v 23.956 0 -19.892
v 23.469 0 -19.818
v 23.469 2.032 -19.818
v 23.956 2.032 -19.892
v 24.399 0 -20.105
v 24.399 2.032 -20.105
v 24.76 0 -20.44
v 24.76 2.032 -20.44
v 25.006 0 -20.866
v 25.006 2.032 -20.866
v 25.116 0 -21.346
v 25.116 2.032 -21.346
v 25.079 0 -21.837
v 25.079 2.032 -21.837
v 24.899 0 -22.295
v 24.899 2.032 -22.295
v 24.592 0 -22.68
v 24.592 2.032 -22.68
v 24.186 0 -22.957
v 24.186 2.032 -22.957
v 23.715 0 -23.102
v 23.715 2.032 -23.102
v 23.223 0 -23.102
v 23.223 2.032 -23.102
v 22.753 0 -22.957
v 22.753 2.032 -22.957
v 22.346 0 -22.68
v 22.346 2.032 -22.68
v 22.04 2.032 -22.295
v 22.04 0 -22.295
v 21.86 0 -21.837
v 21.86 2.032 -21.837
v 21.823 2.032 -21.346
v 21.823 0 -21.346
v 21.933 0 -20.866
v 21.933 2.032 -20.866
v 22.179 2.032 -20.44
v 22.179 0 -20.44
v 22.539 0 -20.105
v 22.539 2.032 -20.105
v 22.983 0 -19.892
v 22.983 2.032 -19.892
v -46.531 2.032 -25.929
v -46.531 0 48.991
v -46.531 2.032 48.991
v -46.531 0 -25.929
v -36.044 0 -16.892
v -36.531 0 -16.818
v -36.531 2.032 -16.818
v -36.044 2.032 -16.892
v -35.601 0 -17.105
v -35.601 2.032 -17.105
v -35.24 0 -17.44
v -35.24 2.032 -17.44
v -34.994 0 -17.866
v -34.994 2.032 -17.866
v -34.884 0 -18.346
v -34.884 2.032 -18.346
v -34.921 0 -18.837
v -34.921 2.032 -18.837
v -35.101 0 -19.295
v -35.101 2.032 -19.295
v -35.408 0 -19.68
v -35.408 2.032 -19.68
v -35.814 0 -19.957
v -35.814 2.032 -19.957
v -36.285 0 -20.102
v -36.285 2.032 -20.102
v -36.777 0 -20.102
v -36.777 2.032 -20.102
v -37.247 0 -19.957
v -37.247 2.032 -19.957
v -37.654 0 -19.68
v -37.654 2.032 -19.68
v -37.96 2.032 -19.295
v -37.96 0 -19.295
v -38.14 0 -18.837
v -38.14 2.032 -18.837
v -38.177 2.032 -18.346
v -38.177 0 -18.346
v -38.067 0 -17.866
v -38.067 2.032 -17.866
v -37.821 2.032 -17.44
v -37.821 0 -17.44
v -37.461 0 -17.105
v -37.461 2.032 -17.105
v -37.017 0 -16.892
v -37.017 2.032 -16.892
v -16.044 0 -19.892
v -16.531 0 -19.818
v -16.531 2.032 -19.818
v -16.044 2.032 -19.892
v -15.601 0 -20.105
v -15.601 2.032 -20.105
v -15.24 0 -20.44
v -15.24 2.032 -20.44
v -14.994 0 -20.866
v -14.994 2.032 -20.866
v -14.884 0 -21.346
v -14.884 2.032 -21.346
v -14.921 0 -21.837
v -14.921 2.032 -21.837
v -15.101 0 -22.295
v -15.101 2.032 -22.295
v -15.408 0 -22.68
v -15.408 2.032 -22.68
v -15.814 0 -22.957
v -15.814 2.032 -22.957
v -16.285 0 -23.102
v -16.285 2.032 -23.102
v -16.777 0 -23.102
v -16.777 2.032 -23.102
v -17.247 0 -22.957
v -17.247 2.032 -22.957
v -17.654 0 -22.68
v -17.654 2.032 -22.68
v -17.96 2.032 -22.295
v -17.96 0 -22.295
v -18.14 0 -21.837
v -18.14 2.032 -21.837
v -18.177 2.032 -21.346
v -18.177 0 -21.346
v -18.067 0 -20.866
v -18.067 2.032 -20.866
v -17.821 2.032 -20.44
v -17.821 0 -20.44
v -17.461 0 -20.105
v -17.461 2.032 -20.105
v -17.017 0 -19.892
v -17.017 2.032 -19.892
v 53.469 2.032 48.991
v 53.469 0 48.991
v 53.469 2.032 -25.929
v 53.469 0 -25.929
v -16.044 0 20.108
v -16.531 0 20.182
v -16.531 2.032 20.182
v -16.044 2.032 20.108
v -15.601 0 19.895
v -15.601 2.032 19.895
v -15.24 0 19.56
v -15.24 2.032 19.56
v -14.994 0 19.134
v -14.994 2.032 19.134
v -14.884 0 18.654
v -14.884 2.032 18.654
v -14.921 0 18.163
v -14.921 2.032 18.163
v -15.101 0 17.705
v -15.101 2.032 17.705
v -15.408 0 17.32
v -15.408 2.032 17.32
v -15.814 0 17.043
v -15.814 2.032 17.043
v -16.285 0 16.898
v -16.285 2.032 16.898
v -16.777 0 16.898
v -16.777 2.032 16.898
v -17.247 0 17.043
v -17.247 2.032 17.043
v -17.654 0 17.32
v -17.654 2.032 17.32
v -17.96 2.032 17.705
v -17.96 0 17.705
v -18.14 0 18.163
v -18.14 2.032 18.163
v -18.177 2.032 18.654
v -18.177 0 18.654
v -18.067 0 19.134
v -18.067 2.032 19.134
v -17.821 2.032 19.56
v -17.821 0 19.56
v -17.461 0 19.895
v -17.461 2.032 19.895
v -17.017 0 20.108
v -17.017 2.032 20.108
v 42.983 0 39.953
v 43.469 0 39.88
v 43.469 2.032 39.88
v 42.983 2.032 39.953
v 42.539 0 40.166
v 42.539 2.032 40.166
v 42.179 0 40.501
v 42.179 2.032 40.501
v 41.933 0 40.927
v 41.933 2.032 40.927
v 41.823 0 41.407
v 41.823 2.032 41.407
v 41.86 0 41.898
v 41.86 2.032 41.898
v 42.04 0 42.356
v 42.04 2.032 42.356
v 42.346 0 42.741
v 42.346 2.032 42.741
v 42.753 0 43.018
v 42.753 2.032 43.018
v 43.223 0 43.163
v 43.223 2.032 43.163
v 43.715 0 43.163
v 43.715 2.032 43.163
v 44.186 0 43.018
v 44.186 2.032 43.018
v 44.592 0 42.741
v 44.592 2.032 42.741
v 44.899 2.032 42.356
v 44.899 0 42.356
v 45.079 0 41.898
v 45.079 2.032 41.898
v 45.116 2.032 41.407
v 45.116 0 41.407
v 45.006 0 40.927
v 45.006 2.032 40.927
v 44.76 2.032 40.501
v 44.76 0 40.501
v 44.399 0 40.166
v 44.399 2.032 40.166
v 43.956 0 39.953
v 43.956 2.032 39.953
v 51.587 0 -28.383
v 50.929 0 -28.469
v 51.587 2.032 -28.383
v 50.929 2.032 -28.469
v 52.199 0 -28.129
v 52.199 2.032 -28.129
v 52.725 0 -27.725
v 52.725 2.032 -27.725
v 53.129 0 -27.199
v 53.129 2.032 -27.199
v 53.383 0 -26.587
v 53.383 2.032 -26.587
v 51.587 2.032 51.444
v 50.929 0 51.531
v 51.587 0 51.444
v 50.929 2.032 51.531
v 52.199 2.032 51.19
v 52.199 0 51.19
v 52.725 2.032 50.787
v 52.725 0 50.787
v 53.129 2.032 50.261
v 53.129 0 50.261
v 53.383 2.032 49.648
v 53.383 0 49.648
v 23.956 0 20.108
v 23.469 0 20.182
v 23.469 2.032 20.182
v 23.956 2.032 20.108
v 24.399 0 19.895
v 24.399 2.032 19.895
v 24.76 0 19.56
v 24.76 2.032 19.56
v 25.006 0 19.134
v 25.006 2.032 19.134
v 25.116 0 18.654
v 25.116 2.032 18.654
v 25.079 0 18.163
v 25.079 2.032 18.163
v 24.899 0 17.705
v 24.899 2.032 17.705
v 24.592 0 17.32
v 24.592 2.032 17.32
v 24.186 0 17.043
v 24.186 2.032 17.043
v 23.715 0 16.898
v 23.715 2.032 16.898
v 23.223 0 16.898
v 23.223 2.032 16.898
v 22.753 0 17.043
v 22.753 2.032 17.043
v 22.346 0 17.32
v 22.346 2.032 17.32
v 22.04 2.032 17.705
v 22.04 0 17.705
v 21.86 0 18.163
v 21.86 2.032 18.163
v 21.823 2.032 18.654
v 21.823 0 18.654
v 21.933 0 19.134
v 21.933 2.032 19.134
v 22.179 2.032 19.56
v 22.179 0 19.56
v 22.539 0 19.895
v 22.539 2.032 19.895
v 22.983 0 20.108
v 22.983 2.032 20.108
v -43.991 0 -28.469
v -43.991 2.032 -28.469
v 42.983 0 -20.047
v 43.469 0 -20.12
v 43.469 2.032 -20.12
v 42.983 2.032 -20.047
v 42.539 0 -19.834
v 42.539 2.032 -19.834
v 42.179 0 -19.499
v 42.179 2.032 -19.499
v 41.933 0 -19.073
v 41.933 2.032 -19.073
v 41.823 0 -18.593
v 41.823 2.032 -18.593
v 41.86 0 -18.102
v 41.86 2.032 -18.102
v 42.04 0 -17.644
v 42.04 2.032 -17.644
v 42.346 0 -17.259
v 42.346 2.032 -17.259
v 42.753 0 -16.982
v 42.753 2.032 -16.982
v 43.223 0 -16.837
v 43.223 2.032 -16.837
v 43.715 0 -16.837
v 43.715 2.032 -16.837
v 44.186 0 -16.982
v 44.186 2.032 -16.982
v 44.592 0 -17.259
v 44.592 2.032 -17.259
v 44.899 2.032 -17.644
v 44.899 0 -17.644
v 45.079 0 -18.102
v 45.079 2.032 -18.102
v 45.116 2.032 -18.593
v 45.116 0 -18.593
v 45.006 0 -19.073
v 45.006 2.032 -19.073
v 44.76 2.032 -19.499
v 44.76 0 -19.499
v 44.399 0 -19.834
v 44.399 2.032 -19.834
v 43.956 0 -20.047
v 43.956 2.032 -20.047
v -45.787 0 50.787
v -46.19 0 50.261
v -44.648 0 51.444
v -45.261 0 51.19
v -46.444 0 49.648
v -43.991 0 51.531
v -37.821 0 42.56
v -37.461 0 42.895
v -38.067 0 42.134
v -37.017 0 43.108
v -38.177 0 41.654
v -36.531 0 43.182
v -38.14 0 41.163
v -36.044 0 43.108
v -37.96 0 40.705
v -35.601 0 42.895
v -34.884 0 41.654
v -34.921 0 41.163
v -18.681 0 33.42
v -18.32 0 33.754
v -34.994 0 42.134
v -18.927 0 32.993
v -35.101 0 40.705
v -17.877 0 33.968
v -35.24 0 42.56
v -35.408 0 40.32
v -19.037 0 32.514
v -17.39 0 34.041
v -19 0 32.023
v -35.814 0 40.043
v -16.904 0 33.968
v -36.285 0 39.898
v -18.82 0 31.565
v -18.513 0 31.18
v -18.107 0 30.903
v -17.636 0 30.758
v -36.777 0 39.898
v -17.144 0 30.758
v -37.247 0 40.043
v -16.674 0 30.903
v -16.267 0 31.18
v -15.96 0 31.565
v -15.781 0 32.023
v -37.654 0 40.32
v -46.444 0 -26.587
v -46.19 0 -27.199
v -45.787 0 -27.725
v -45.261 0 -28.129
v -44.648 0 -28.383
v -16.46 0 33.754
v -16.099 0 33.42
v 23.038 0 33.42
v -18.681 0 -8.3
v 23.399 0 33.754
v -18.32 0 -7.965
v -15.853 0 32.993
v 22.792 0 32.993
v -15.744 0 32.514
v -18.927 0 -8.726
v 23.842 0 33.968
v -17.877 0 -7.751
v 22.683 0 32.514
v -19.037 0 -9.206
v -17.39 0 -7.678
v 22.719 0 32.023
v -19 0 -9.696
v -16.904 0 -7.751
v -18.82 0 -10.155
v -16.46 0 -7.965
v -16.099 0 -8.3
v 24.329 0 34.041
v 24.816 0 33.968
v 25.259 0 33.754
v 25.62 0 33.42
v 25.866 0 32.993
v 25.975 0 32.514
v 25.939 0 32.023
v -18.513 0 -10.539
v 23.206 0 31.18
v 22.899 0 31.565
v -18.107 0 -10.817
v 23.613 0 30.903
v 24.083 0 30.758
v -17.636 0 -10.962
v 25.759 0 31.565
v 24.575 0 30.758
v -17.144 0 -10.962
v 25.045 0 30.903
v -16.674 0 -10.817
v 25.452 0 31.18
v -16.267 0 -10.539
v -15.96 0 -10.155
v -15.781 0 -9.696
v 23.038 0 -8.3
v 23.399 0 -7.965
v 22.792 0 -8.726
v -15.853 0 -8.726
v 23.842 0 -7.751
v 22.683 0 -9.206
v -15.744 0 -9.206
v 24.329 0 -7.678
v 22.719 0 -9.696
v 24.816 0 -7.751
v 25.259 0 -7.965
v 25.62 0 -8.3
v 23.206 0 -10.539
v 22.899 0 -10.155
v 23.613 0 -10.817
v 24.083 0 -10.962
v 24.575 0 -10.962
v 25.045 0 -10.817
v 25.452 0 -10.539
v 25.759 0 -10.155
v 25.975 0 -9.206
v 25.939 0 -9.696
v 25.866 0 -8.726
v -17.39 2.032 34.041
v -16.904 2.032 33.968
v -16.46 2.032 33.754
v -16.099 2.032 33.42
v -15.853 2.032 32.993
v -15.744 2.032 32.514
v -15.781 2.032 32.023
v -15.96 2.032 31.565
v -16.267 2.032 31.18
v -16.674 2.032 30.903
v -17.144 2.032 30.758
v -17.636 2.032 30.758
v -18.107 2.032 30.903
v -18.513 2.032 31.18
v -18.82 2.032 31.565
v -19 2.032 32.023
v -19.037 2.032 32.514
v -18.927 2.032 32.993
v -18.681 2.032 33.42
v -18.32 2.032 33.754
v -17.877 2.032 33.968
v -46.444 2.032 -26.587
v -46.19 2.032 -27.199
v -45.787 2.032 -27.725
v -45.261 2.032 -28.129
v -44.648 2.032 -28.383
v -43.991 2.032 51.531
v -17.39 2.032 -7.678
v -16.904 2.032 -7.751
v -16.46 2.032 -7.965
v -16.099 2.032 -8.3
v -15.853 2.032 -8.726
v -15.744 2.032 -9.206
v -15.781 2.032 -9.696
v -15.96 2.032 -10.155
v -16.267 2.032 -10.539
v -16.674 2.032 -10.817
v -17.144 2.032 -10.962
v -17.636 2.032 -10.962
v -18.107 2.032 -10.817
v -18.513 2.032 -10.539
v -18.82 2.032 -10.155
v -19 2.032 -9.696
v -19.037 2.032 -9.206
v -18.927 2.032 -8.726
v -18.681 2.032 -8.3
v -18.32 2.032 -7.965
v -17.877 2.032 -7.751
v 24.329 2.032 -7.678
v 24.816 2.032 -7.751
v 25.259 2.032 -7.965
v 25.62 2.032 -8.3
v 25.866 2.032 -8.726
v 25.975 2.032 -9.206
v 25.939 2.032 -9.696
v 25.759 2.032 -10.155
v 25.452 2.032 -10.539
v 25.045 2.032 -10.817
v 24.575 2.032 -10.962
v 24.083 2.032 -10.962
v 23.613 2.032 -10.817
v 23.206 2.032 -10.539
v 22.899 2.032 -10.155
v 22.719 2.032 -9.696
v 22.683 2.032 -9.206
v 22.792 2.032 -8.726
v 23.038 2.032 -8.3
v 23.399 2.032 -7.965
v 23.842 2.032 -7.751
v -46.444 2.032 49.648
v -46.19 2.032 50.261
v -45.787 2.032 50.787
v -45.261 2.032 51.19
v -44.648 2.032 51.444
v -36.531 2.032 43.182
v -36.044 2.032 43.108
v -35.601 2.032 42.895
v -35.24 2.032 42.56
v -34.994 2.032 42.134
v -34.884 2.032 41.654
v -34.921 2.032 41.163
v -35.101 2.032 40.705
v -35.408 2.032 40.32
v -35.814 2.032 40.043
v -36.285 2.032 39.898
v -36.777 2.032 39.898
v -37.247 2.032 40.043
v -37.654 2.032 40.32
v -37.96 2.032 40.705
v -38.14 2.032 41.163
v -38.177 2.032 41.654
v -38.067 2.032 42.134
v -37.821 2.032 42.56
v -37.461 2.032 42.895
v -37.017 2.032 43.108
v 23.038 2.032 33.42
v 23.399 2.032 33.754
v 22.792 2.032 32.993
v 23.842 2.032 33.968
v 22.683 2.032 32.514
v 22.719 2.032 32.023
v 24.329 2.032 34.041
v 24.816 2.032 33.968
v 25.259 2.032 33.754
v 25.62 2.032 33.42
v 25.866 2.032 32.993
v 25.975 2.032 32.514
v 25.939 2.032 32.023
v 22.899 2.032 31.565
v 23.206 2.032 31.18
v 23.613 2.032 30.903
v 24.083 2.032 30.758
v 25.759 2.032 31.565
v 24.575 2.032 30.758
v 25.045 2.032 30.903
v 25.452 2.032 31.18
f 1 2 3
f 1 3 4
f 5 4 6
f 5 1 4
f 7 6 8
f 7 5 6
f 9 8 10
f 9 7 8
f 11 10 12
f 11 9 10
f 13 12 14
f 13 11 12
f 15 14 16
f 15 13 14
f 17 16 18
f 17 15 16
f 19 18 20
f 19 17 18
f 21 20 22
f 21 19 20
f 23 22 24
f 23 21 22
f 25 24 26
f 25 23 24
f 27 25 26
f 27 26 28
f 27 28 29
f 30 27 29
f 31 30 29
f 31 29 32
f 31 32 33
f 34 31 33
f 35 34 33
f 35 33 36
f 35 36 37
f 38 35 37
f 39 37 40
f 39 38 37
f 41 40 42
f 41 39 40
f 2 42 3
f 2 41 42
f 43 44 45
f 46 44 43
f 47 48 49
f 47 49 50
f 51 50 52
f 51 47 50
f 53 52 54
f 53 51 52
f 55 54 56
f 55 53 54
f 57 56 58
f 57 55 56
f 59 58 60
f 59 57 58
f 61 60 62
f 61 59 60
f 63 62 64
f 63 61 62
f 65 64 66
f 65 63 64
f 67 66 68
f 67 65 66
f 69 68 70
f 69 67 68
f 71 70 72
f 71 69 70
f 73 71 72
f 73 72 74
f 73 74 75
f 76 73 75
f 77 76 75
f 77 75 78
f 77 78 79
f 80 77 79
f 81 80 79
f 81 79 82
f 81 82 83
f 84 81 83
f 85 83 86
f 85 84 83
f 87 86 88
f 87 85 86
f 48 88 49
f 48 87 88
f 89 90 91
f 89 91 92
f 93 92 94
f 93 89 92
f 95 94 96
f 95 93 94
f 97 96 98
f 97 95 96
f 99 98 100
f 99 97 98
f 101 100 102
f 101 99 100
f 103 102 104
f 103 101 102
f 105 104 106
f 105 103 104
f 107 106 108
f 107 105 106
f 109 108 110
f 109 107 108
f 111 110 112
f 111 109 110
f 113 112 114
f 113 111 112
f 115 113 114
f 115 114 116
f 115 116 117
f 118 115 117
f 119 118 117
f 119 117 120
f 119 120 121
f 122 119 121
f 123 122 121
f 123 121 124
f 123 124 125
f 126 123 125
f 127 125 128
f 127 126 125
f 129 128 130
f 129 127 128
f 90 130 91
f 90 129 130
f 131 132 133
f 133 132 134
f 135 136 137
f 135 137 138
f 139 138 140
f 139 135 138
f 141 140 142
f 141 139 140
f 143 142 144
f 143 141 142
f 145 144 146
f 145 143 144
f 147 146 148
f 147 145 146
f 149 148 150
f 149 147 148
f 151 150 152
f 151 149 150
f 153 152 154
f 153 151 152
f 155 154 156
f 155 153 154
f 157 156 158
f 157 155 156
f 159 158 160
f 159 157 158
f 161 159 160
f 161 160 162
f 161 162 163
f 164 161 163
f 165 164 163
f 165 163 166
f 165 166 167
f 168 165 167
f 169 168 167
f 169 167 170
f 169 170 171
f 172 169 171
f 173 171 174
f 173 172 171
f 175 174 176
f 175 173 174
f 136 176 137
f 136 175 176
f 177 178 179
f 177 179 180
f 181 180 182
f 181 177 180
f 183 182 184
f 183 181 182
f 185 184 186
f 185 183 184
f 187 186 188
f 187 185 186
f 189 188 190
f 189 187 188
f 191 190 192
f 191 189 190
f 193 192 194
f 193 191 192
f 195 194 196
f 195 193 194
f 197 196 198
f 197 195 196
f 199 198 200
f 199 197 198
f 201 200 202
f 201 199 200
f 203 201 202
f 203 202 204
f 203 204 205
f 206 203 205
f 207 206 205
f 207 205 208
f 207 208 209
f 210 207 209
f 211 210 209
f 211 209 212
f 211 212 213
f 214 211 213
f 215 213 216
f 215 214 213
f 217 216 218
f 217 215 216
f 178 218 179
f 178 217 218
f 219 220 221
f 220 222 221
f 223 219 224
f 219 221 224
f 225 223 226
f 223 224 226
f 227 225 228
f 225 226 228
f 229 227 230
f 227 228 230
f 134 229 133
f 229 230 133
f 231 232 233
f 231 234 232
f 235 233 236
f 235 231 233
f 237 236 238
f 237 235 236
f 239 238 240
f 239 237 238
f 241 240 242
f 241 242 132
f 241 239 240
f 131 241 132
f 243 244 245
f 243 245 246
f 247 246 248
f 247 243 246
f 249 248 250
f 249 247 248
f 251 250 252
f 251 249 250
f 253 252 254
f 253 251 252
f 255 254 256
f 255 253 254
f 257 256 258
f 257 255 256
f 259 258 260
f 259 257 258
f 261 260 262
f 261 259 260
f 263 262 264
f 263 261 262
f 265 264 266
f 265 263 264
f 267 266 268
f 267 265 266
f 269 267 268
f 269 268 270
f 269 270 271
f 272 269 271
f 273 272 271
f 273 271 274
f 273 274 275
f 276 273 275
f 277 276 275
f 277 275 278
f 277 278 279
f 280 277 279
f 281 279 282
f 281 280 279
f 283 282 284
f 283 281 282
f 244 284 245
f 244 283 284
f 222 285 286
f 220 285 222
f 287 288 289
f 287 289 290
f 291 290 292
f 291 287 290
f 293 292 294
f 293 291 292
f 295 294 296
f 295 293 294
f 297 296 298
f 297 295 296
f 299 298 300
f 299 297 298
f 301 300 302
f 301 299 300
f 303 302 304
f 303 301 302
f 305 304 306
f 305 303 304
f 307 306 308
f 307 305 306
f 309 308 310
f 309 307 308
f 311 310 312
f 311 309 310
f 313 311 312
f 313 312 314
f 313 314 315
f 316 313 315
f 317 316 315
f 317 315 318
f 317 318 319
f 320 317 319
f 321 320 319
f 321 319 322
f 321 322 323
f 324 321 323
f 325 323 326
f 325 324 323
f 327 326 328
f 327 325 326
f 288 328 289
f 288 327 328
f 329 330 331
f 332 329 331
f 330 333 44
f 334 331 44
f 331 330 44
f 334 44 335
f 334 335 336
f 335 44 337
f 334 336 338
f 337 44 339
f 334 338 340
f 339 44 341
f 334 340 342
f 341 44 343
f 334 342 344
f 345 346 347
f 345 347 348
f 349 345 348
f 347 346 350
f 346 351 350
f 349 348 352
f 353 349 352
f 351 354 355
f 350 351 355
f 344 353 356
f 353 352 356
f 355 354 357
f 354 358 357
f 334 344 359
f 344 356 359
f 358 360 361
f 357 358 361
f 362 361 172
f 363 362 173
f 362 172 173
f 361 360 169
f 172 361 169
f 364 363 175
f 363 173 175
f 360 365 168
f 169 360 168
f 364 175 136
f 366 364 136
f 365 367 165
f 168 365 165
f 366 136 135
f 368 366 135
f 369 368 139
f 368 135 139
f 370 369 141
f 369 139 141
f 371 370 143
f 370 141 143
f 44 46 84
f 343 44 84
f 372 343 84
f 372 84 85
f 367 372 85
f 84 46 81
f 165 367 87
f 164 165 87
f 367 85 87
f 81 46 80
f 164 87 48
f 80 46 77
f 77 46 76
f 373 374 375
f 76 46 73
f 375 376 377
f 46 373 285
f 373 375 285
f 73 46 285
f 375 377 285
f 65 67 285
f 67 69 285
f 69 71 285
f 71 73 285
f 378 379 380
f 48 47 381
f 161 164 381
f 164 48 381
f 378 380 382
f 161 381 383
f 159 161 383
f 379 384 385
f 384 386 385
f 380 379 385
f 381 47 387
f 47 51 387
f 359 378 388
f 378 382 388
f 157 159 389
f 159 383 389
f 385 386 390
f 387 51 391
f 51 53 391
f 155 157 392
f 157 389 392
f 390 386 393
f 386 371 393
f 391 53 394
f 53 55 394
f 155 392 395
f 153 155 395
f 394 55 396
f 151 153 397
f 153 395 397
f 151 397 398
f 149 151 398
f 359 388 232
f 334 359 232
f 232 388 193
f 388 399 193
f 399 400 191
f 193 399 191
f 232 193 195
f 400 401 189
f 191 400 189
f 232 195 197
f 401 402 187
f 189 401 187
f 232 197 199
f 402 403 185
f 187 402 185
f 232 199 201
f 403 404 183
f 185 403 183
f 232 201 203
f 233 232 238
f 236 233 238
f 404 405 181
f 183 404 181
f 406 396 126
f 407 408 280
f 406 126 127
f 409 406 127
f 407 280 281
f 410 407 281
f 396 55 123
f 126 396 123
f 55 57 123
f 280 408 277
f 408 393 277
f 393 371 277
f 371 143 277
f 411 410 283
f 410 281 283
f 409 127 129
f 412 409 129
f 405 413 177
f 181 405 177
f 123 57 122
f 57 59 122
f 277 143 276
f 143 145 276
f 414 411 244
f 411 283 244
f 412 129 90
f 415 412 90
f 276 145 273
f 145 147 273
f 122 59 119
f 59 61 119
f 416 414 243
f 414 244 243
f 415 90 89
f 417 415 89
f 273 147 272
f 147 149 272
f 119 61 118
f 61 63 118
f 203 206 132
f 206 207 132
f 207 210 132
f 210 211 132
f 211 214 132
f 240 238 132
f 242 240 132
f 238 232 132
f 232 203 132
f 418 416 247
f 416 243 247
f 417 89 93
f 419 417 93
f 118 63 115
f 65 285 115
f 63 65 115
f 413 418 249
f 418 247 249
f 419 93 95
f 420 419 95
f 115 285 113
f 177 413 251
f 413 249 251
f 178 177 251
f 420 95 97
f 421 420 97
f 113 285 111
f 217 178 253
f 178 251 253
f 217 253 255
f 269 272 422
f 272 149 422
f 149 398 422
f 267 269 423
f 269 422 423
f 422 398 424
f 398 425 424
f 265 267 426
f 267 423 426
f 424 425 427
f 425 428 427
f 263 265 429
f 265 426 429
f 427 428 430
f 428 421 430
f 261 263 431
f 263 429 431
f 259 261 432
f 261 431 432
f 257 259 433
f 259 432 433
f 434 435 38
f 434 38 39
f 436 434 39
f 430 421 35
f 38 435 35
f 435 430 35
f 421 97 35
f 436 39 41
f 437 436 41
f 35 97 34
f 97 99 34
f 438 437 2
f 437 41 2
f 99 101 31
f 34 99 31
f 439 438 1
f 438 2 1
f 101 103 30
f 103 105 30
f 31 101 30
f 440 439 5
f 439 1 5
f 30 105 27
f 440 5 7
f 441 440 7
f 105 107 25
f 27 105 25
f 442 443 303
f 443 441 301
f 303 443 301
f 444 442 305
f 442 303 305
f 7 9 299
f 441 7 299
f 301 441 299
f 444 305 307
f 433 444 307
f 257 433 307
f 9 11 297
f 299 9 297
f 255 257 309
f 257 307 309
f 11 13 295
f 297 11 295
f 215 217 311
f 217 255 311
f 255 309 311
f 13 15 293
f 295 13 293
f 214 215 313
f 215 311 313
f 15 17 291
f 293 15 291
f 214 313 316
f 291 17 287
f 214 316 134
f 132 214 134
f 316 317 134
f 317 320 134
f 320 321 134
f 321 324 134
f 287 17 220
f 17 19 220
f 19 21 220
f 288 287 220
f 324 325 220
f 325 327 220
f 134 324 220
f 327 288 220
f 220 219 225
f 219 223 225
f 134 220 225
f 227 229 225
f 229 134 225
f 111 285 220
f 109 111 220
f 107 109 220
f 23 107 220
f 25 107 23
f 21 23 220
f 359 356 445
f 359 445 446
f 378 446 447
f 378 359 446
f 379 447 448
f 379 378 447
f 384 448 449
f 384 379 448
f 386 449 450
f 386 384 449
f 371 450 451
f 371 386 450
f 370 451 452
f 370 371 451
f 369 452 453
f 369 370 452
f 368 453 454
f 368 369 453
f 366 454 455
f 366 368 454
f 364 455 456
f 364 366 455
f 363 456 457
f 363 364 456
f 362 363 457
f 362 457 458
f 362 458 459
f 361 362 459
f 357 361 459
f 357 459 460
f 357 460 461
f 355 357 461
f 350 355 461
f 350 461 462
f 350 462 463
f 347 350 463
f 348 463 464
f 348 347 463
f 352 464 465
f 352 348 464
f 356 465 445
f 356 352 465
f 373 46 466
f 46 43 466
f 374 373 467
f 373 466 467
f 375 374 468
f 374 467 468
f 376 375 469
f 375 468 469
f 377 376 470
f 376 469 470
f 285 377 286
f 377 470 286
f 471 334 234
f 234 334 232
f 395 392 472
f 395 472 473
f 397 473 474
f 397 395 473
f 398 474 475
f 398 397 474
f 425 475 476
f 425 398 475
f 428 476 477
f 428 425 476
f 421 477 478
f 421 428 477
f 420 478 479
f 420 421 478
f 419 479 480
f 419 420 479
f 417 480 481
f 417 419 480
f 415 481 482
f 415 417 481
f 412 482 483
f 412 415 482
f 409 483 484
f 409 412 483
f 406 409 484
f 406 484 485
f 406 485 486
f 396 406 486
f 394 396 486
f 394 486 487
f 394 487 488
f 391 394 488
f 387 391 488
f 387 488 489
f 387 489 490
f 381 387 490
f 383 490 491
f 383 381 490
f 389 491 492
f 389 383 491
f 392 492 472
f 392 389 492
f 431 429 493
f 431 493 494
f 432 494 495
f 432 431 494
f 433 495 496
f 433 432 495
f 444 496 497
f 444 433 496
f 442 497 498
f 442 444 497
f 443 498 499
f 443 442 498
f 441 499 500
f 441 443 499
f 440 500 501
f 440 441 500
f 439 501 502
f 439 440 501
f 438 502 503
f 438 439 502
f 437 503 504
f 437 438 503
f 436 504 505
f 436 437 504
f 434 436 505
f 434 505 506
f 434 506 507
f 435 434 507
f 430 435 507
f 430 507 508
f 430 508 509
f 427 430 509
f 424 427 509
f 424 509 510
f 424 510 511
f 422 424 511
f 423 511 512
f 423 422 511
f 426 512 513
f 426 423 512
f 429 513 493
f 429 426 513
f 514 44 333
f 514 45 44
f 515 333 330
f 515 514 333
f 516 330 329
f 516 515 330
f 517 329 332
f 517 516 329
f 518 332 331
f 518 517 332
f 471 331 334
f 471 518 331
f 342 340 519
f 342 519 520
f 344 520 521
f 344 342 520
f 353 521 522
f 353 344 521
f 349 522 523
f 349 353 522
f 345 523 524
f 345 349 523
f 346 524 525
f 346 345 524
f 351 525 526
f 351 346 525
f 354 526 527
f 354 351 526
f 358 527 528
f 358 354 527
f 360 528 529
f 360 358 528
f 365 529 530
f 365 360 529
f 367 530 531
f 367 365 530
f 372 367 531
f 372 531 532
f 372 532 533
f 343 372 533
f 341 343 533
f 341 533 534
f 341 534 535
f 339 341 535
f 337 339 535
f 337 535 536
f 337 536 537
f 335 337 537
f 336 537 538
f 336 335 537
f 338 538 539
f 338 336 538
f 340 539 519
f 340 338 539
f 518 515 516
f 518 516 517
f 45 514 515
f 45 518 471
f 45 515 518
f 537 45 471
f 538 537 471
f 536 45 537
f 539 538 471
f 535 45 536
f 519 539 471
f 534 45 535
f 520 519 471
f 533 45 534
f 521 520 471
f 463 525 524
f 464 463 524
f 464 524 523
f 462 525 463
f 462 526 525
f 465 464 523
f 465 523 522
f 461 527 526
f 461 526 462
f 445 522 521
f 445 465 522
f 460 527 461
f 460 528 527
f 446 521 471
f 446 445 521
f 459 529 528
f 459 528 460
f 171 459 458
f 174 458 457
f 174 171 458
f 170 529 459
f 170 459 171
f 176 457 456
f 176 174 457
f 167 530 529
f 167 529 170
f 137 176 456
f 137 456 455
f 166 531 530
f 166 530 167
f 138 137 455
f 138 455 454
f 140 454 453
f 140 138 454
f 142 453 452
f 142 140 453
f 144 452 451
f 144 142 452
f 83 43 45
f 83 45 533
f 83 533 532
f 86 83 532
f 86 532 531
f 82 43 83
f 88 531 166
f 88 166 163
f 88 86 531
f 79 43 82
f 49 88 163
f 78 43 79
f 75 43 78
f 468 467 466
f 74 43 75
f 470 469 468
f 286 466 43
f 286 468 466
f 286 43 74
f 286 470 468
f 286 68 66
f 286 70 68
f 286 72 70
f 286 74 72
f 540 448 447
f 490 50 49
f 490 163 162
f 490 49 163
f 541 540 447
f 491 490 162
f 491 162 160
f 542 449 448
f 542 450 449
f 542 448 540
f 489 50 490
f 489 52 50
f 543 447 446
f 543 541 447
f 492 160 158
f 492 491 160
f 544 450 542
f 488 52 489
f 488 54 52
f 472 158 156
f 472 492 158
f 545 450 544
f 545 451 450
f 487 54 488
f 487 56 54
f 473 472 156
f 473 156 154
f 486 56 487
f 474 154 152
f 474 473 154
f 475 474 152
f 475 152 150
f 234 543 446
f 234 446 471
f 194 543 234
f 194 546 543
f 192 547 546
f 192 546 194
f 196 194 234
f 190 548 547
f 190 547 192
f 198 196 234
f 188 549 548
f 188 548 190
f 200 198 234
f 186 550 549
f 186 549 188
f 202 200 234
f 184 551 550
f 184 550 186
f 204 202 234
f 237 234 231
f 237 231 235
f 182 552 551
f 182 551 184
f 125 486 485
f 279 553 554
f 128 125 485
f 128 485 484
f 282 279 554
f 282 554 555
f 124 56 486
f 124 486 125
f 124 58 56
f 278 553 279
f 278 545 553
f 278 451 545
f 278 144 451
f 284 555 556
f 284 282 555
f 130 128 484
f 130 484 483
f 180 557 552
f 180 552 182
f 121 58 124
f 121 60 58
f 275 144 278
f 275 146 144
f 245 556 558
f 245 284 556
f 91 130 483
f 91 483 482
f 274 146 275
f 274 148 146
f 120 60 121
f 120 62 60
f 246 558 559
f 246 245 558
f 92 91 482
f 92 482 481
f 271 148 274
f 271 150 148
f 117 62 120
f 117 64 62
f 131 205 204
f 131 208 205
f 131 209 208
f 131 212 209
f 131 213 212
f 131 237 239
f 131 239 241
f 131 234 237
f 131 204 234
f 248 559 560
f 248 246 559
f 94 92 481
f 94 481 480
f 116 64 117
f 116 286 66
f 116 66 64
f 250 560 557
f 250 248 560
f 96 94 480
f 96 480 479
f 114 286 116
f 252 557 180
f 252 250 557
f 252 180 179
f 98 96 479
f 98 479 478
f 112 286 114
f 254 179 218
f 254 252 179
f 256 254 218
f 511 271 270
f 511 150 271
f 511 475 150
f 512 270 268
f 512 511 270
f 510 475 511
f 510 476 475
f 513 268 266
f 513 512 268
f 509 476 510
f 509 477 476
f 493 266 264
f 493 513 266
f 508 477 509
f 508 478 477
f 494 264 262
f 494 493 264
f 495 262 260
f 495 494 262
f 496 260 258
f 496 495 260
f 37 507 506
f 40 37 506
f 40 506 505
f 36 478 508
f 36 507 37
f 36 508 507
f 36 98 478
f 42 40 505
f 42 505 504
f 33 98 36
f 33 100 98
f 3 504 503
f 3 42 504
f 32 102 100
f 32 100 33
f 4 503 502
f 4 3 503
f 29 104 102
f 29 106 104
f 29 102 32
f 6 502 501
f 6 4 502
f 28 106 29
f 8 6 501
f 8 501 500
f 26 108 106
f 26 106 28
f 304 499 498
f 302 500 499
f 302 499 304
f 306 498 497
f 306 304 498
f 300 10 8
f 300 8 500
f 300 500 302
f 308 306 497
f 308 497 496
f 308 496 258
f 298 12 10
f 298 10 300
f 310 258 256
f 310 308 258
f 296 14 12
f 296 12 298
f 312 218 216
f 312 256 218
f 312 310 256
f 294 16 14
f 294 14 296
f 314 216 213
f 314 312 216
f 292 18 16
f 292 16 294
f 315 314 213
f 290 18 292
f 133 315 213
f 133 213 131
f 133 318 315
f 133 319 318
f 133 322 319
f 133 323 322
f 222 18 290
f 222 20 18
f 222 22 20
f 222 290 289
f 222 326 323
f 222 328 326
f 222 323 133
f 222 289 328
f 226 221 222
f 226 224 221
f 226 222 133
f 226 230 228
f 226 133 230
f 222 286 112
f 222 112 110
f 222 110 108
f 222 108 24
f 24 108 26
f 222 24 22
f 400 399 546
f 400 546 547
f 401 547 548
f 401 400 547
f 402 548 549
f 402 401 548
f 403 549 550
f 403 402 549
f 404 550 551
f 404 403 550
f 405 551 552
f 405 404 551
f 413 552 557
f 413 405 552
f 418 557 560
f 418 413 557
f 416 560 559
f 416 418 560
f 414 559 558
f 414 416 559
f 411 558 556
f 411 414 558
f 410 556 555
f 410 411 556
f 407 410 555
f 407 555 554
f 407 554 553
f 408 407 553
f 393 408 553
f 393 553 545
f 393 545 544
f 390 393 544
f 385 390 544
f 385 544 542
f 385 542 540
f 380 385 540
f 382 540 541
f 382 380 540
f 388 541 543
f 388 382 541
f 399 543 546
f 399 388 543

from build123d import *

# Parameters (mm, degrees)
SKETCH1_W           = 100
SKETCH1_H           = 80
SKETCH1_R           = 1.651
BOSS_EXTRUDE1_DEPTH = 2.032
FILLET1_R           = 2.54
FILLET2_R           = 2.54


with BuildPart() as part:
    # Sketch1 → Boss-Extrude1 (new body)
    with BuildSketch(Plane(origin=(0, 0, 0), x_dir=(1, 0, 0), z_dir=(0, 1, 0))):
        with Locations((3.469387755, -11.530612245)):
            Rectangle(SKETCH1_W, SKETCH1_H)
        with Locations(Location((-36.530612245, 18.469387755, 0), (0, 0, 270))):
            Circle(SKETCH1_R, mode=Mode.SUBTRACT)
        with Locations(Location((-36.530612245, -41.530612245, 0), (0, 0, 270))):
            Circle(SKETCH1_R, mode=Mode.SUBTRACT)
        with Locations(Location((-16.530612245, 21.469387755, 0), (0, 0, 270))):
            Circle(SKETCH1_R, mode=Mode.SUBTRACT)
        with Locations(Location((23.469387755, 21.469387755, 0), (0, 0, 270))):
            Circle(SKETCH1_R, mode=Mode.SUBTRACT)
        with Locations(Location((-16.530612245, -18.530612245, 0), (0, 0, 270))):
            Circle(SKETCH1_R, mode=Mode.SUBTRACT)
        with Locations(Location((23.469387755, -18.530612245, 0), (0, 0, 270))):
            Circle(SKETCH1_R, mode=Mode.SUBTRACT)
        with Locations(Location((-17.39026229, 9.3290378, 0), (0, 0, 270))):
            Circle(SKETCH1_R, mode=Mode.SUBTRACT)
        with Locations(Location((24.3290378, 9.3290378, 0), (0, 0, 270))):
            Circle(SKETCH1_R, mode=Mode.SUBTRACT)
        with Locations(Location((43.469387755, -41.530612245, 0), (0, 0, 90))):
            Circle(SKETCH1_R, mode=Mode.SUBTRACT)
        with Locations(Location((43.469387755, 18.469387755, 0), (0, 0, 90))):
            Circle(SKETCH1_R, mode=Mode.SUBTRACT)
        with Locations(Location((-17.39026229, -32.39026229, 0), (0, 0, 270))):
            Circle(SKETCH1_R, mode=Mode.SUBTRACT)
        with Locations(Location((24.3290378, -32.39026229, 0), (0, 0, 270))):
            Circle(SKETCH1_R, mode=Mode.SUBTRACT)
    extrude(amount=BOSS_EXTRUDE1_DEPTH)

    # Fillet1
    fillet1_edges = [part.edges().sort_by_distance(p)[0] for p in [
        (-46.530612245, 1.016, 51.530612245),
    ]]
    fillet(fillet1_edges, radius=FILLET1_R)

    # Fillet2
    fillet2_edges = [part.edges().sort_by_distance(p)[0] for p in [
        (-46.530612245, 1.016, -28.469387755),
        (53.469387755, 1.016, -28.469387755),
        (53.469387755, 1.016, 51.530612245),
    ]]
    fillet(fillet2_edges, radius=FILLET2_R)


solid = part.part
